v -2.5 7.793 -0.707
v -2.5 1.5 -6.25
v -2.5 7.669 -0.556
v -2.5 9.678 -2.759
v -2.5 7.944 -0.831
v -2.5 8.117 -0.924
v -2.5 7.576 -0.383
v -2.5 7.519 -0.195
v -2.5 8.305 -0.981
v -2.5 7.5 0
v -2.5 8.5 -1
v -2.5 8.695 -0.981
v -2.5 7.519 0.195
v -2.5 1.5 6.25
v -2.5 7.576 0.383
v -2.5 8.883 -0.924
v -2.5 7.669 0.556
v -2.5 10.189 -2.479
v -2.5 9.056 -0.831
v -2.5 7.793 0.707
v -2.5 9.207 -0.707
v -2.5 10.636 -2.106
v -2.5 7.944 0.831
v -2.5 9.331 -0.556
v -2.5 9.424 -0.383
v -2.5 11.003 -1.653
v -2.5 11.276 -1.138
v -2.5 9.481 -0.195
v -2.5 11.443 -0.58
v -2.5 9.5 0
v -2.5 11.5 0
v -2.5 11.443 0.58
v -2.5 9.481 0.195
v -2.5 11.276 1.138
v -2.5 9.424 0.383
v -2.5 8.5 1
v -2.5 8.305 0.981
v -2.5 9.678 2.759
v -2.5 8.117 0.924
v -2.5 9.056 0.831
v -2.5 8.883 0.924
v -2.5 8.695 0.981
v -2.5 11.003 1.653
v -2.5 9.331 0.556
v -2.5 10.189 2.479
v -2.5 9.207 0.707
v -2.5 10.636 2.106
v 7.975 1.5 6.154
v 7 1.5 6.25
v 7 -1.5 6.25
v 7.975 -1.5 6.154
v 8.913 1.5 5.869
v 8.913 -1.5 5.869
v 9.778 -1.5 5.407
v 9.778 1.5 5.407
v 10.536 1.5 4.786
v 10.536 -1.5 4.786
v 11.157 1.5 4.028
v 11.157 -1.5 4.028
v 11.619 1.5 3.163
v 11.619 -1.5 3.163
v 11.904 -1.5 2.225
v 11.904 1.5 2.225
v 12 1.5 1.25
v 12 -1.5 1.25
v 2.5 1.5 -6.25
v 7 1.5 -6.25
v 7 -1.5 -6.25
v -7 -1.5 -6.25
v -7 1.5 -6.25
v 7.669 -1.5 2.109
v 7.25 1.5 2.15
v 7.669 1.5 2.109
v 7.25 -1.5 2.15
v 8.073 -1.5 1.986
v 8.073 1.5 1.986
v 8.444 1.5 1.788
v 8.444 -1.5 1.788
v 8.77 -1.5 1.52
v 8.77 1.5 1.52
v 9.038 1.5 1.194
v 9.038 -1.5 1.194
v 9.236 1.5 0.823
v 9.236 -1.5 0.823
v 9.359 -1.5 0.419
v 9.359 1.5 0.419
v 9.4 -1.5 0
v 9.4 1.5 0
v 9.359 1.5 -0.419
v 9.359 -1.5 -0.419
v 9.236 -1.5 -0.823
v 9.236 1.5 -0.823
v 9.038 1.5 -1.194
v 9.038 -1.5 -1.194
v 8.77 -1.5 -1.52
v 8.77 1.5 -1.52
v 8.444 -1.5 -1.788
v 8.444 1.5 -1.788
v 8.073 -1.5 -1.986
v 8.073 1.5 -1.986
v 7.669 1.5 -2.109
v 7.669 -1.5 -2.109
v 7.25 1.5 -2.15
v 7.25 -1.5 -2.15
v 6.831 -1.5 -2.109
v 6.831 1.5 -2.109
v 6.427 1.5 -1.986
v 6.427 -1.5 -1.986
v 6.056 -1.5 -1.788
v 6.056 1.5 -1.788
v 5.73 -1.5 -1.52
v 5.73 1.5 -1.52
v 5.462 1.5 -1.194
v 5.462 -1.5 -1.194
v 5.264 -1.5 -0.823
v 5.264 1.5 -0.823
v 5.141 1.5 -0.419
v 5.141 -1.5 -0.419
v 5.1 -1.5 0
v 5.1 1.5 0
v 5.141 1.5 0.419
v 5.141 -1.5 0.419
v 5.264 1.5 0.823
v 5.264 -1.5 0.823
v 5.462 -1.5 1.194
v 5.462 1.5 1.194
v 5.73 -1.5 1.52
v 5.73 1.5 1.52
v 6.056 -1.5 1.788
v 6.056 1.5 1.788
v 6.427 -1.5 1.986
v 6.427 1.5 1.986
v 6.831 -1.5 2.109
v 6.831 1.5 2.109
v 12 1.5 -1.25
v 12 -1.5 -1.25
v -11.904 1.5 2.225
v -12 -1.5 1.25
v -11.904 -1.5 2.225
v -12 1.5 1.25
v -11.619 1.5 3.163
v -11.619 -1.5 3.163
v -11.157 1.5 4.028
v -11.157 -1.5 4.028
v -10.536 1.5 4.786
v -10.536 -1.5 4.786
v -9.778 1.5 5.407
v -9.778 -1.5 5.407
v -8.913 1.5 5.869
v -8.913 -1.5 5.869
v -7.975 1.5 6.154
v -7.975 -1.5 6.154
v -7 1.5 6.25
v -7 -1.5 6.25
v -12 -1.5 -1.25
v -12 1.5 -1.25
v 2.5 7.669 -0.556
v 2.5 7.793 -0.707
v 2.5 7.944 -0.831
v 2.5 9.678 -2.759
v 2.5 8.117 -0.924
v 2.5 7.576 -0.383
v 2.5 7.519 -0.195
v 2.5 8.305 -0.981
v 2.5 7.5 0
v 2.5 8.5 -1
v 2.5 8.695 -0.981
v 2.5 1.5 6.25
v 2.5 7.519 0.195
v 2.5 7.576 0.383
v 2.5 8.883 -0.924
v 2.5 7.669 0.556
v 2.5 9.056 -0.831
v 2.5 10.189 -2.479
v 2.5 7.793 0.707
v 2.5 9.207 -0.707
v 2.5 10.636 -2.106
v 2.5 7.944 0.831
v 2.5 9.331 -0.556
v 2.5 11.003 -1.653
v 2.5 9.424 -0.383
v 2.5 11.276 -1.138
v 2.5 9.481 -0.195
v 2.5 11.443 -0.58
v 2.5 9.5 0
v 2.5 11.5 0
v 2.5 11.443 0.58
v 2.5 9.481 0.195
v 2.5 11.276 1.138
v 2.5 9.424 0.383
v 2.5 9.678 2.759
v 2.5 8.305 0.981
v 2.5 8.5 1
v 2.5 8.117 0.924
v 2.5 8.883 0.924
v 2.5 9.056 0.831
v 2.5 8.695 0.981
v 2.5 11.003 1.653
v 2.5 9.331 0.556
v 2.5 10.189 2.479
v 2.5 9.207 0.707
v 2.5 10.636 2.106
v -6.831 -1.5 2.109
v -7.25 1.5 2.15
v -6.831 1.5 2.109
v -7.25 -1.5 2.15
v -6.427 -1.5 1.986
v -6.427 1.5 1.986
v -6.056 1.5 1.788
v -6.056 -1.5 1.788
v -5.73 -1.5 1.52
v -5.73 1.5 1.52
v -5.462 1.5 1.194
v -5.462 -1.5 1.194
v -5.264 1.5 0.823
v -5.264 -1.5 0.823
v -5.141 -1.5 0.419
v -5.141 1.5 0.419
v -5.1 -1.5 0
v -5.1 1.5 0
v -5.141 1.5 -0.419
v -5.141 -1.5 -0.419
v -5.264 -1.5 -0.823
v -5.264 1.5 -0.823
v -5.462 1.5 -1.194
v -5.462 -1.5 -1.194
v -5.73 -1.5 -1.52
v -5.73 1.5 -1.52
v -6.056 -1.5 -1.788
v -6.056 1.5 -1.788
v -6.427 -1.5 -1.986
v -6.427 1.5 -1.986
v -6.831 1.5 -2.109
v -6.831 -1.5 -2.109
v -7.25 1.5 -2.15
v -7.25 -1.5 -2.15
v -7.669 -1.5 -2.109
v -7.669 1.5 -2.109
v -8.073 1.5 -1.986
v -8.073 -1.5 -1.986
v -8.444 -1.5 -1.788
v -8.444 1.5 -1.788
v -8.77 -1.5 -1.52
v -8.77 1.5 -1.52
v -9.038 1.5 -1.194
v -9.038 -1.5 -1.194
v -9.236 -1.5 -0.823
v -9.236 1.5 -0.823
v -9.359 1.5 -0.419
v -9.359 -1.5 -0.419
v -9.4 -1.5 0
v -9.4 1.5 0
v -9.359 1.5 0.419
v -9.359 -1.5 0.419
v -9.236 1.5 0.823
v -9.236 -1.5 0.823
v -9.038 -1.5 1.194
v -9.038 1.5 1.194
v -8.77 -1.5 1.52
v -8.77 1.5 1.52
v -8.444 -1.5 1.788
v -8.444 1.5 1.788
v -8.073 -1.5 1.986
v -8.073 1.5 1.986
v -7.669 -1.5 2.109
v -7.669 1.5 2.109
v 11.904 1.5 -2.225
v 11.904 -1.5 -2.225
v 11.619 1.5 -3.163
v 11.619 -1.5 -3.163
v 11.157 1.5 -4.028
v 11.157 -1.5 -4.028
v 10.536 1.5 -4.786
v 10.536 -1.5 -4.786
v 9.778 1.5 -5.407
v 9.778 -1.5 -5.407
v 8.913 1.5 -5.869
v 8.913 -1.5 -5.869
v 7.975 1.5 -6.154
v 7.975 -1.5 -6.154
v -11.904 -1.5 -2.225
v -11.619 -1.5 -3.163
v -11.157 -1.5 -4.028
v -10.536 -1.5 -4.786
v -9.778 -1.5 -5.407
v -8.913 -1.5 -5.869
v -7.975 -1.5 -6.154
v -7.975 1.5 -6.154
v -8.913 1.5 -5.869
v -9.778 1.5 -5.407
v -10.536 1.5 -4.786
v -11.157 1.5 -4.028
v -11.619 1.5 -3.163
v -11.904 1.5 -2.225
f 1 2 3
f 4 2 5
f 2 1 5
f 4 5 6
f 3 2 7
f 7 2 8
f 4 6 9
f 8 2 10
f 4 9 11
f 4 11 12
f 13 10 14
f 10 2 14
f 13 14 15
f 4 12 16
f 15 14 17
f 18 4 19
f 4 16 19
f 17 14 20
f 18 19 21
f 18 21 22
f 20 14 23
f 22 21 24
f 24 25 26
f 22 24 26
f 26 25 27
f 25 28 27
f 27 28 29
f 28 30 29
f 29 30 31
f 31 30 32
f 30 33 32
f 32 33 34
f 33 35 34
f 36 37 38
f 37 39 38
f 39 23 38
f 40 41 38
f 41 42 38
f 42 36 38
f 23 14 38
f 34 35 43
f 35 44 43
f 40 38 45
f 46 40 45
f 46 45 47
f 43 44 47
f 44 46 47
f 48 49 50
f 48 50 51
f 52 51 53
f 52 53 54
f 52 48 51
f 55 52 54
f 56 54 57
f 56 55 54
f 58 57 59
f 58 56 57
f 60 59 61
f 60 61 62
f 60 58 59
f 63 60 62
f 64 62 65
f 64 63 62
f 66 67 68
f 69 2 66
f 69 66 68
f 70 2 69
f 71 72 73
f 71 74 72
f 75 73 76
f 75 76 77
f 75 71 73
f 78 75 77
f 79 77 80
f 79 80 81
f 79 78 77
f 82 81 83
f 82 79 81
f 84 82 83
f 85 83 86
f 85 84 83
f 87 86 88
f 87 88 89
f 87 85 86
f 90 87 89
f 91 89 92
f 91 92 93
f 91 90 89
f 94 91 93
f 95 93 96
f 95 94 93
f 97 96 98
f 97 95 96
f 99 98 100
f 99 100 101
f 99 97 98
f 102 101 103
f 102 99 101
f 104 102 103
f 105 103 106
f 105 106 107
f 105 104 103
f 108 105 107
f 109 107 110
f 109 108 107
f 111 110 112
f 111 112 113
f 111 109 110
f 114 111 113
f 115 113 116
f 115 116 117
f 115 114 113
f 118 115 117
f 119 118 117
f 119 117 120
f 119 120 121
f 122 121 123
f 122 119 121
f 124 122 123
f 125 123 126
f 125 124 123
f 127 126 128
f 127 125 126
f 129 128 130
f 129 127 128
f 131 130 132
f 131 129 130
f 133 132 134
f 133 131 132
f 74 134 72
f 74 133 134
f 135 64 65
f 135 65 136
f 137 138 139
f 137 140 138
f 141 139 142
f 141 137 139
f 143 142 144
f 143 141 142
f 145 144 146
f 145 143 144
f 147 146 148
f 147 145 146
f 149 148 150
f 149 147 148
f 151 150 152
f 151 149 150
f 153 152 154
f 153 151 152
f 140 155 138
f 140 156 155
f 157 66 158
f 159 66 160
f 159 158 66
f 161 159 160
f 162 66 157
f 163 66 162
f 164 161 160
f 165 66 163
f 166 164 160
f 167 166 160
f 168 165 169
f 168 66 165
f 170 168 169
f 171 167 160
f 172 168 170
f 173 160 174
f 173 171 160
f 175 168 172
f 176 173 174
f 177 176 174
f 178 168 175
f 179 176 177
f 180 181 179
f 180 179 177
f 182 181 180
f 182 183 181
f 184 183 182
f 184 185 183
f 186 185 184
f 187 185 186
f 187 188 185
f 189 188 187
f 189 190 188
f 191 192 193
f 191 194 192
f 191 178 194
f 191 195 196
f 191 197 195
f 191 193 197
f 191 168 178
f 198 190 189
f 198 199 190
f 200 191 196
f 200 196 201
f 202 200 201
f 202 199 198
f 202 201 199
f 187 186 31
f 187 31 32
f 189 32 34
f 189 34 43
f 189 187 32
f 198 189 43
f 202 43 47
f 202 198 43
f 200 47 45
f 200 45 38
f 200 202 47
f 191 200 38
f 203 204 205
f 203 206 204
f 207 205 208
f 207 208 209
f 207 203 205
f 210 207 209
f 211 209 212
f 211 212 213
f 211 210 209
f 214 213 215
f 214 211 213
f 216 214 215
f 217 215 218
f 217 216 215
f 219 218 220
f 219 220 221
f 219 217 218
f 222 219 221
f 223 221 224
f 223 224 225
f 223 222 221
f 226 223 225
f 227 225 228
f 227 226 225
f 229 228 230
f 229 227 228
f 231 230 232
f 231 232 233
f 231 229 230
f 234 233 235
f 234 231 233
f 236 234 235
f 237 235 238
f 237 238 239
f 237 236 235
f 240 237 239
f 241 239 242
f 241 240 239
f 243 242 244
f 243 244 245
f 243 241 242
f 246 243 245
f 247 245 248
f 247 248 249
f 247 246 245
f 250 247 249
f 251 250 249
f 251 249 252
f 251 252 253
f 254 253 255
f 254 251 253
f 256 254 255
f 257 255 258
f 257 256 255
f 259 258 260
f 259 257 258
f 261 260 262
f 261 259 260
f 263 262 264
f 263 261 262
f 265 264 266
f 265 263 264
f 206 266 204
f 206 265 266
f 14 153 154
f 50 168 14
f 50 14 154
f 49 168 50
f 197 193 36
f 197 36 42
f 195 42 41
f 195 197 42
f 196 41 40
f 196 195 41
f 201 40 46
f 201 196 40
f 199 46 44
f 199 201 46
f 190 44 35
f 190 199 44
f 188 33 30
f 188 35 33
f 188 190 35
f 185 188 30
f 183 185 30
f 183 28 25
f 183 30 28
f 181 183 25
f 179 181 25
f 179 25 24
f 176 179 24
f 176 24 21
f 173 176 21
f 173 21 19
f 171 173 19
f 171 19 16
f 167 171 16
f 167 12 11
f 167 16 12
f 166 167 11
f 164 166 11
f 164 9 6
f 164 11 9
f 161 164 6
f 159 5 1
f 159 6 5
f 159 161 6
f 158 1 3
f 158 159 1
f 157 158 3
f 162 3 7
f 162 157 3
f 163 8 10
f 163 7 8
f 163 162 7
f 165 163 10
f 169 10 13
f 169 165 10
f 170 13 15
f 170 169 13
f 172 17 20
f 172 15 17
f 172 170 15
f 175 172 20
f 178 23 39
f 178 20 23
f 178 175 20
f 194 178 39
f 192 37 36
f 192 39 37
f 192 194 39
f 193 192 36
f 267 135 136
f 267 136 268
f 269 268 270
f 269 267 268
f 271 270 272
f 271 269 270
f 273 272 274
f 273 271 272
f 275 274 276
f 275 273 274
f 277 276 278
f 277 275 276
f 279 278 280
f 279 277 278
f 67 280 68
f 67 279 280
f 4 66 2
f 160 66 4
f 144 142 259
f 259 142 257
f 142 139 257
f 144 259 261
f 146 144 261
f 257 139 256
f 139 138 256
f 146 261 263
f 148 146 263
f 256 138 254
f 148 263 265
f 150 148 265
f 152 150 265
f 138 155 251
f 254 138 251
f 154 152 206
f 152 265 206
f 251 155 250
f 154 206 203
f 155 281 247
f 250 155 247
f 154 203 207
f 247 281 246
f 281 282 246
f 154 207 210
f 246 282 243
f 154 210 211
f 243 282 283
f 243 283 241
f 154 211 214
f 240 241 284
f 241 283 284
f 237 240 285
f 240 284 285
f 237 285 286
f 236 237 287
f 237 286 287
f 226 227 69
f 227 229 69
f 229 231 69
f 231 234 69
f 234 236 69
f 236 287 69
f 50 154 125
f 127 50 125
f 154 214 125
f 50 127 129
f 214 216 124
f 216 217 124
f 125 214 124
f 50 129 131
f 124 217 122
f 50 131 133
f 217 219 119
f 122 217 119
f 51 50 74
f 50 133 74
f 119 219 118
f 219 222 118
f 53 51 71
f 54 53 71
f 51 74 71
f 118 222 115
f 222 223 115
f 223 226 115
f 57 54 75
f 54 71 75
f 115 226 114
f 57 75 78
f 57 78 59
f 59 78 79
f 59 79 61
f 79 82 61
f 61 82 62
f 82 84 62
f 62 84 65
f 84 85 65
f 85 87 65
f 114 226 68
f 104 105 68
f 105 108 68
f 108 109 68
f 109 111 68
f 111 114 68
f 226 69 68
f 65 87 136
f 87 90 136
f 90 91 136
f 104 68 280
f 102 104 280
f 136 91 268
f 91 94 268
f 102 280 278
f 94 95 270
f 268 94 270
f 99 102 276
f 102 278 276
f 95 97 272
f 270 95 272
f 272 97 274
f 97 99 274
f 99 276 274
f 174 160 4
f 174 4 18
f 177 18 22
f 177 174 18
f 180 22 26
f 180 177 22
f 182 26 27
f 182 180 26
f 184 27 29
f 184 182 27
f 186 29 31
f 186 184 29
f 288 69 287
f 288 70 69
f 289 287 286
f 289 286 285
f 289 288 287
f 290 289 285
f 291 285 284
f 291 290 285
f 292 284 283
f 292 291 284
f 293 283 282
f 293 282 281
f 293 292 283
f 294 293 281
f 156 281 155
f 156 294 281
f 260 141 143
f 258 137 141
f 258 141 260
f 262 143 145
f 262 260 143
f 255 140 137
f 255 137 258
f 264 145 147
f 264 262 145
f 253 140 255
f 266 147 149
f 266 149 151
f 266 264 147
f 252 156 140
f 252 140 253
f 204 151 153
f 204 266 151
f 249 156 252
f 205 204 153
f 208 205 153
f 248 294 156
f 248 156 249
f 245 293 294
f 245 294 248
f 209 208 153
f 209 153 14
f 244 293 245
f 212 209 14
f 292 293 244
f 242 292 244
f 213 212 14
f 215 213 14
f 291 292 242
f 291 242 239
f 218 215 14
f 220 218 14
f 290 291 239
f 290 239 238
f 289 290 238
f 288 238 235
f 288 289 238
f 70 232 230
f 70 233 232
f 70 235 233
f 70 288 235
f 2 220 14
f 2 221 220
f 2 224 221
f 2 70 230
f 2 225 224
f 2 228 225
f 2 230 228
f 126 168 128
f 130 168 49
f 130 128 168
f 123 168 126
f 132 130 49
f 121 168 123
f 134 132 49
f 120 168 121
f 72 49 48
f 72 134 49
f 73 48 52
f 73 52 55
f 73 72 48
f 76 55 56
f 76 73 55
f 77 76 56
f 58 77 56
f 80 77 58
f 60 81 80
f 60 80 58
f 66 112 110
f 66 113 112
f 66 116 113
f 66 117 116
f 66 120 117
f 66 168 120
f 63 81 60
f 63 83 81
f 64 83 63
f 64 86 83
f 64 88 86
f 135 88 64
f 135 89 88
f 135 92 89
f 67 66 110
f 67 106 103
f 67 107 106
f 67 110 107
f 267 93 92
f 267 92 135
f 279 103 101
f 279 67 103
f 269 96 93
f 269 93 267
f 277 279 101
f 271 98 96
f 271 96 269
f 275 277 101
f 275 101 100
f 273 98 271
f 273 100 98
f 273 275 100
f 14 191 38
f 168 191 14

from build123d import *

# Parameters (mm, degrees)
SKETCH1_R               = 2.15
BOSS_EXTRUDE1_DEPTH     = 1.5
SKETCH3_W               = 5
SKETCH3_H               = 10
BOSS_EXTRUDE3_DEPTH     = 12.5
CUT_EXTRUDE1_DEPTH      = 20.533624856
CUT_EXTRUDE1_DEPTH_BACK = 20.533624856
SKETCH4_R               = 1


with BuildPart() as part:
    # Sketch1 → Boss-Extrude1 (new, symmetric)
    with BuildSketch(Plane(origin=(0, 0, 0), x_dir=(1, 0, 0), z_dir=(0, 1, 0))):
        with BuildLine():
            Line((-7, -6.25), (7, -6.25))
            ThreePointArc((7, -6.25), (10.535533906, -4.785533906), (12, -1.25))
            Line((12, -1.25), (12, 1.25))
            ThreePointArc((12, 1.25), (10.535533906, 4.785533906), (7, 6.25))
            Line((7, 6.25), (-7, 6.25))
            ThreePointArc((-7, 6.25), (-10.535533906, 4.785533906), (-12, 1.25))
            Line((-12, 1.25), (-12, -1.25))
            ThreePointArc((-12, -1.25), (-10.535533906, -4.785533906), (-7, -6.25))
        make_face()
        with Locations(Location((-7.25, 0, 0), (0, 0, 270))):
            Circle(SKETCH1_R, mode=Mode.SUBTRACT)
        with Locations(Location((7.25, 0, 0), (0, 0, 270))):
            Circle(SKETCH1_R, mode=Mode.SUBTRACT)
    extrude(amount=BOSS_EXTRUDE1_DEPTH, both=True)

    # Sketch3 → Boss-Extrude3 (add)
    with BuildSketch(Plane.XY.offset(6.25)):
        with Locations((0, 6.5)):
            Rectangle(SKETCH3_W, SKETCH3_H)
    extrude(amount=-BOSS_EXTRUDE3_DEPTH)

    # Sketch4 → Cut-Extrude1 (cut, two sides: drawn at the far end of the back side and taken through both)
    with BuildSketch(Plane.ZY.offset(2.5).offset(-CUT_EXTRUDE1_DEPTH_BACK)):
        with BuildLine():
            Line((-6.25, 1.5), (-2.759130187, 9.677794809))
            ThreePointArc((-2.759130187, 9.677794809), (-1.653271843, 11.003336217), (0, 11.5))
            Line((0, 11.5), (-6.25, 11.5))
            Line((-6.25, 11.5), (-6.25, 1.5))
        make_face()
        with BuildLine():
            Line((6.25, 11.5), (0, 11.5))
            ThreePointArc((0, 11.5), (1.653271843, 11.003336217), (2.759130187, 9.677794809))
            Line((2.759130187, 9.677794809), (6.25, 1.5))
            Line((6.25, 1.5), (6.25, 11.5))
        make_face()
        with Locations((0, 8.5)):
            Circle(SKETCH4_R)
    extrude(amount=CUT_EXTRUDE1_DEPTH + CUT_EXTRUDE1_DEPTH_BACK, mode=Mode.SUBTRACT)


solid = part.part
